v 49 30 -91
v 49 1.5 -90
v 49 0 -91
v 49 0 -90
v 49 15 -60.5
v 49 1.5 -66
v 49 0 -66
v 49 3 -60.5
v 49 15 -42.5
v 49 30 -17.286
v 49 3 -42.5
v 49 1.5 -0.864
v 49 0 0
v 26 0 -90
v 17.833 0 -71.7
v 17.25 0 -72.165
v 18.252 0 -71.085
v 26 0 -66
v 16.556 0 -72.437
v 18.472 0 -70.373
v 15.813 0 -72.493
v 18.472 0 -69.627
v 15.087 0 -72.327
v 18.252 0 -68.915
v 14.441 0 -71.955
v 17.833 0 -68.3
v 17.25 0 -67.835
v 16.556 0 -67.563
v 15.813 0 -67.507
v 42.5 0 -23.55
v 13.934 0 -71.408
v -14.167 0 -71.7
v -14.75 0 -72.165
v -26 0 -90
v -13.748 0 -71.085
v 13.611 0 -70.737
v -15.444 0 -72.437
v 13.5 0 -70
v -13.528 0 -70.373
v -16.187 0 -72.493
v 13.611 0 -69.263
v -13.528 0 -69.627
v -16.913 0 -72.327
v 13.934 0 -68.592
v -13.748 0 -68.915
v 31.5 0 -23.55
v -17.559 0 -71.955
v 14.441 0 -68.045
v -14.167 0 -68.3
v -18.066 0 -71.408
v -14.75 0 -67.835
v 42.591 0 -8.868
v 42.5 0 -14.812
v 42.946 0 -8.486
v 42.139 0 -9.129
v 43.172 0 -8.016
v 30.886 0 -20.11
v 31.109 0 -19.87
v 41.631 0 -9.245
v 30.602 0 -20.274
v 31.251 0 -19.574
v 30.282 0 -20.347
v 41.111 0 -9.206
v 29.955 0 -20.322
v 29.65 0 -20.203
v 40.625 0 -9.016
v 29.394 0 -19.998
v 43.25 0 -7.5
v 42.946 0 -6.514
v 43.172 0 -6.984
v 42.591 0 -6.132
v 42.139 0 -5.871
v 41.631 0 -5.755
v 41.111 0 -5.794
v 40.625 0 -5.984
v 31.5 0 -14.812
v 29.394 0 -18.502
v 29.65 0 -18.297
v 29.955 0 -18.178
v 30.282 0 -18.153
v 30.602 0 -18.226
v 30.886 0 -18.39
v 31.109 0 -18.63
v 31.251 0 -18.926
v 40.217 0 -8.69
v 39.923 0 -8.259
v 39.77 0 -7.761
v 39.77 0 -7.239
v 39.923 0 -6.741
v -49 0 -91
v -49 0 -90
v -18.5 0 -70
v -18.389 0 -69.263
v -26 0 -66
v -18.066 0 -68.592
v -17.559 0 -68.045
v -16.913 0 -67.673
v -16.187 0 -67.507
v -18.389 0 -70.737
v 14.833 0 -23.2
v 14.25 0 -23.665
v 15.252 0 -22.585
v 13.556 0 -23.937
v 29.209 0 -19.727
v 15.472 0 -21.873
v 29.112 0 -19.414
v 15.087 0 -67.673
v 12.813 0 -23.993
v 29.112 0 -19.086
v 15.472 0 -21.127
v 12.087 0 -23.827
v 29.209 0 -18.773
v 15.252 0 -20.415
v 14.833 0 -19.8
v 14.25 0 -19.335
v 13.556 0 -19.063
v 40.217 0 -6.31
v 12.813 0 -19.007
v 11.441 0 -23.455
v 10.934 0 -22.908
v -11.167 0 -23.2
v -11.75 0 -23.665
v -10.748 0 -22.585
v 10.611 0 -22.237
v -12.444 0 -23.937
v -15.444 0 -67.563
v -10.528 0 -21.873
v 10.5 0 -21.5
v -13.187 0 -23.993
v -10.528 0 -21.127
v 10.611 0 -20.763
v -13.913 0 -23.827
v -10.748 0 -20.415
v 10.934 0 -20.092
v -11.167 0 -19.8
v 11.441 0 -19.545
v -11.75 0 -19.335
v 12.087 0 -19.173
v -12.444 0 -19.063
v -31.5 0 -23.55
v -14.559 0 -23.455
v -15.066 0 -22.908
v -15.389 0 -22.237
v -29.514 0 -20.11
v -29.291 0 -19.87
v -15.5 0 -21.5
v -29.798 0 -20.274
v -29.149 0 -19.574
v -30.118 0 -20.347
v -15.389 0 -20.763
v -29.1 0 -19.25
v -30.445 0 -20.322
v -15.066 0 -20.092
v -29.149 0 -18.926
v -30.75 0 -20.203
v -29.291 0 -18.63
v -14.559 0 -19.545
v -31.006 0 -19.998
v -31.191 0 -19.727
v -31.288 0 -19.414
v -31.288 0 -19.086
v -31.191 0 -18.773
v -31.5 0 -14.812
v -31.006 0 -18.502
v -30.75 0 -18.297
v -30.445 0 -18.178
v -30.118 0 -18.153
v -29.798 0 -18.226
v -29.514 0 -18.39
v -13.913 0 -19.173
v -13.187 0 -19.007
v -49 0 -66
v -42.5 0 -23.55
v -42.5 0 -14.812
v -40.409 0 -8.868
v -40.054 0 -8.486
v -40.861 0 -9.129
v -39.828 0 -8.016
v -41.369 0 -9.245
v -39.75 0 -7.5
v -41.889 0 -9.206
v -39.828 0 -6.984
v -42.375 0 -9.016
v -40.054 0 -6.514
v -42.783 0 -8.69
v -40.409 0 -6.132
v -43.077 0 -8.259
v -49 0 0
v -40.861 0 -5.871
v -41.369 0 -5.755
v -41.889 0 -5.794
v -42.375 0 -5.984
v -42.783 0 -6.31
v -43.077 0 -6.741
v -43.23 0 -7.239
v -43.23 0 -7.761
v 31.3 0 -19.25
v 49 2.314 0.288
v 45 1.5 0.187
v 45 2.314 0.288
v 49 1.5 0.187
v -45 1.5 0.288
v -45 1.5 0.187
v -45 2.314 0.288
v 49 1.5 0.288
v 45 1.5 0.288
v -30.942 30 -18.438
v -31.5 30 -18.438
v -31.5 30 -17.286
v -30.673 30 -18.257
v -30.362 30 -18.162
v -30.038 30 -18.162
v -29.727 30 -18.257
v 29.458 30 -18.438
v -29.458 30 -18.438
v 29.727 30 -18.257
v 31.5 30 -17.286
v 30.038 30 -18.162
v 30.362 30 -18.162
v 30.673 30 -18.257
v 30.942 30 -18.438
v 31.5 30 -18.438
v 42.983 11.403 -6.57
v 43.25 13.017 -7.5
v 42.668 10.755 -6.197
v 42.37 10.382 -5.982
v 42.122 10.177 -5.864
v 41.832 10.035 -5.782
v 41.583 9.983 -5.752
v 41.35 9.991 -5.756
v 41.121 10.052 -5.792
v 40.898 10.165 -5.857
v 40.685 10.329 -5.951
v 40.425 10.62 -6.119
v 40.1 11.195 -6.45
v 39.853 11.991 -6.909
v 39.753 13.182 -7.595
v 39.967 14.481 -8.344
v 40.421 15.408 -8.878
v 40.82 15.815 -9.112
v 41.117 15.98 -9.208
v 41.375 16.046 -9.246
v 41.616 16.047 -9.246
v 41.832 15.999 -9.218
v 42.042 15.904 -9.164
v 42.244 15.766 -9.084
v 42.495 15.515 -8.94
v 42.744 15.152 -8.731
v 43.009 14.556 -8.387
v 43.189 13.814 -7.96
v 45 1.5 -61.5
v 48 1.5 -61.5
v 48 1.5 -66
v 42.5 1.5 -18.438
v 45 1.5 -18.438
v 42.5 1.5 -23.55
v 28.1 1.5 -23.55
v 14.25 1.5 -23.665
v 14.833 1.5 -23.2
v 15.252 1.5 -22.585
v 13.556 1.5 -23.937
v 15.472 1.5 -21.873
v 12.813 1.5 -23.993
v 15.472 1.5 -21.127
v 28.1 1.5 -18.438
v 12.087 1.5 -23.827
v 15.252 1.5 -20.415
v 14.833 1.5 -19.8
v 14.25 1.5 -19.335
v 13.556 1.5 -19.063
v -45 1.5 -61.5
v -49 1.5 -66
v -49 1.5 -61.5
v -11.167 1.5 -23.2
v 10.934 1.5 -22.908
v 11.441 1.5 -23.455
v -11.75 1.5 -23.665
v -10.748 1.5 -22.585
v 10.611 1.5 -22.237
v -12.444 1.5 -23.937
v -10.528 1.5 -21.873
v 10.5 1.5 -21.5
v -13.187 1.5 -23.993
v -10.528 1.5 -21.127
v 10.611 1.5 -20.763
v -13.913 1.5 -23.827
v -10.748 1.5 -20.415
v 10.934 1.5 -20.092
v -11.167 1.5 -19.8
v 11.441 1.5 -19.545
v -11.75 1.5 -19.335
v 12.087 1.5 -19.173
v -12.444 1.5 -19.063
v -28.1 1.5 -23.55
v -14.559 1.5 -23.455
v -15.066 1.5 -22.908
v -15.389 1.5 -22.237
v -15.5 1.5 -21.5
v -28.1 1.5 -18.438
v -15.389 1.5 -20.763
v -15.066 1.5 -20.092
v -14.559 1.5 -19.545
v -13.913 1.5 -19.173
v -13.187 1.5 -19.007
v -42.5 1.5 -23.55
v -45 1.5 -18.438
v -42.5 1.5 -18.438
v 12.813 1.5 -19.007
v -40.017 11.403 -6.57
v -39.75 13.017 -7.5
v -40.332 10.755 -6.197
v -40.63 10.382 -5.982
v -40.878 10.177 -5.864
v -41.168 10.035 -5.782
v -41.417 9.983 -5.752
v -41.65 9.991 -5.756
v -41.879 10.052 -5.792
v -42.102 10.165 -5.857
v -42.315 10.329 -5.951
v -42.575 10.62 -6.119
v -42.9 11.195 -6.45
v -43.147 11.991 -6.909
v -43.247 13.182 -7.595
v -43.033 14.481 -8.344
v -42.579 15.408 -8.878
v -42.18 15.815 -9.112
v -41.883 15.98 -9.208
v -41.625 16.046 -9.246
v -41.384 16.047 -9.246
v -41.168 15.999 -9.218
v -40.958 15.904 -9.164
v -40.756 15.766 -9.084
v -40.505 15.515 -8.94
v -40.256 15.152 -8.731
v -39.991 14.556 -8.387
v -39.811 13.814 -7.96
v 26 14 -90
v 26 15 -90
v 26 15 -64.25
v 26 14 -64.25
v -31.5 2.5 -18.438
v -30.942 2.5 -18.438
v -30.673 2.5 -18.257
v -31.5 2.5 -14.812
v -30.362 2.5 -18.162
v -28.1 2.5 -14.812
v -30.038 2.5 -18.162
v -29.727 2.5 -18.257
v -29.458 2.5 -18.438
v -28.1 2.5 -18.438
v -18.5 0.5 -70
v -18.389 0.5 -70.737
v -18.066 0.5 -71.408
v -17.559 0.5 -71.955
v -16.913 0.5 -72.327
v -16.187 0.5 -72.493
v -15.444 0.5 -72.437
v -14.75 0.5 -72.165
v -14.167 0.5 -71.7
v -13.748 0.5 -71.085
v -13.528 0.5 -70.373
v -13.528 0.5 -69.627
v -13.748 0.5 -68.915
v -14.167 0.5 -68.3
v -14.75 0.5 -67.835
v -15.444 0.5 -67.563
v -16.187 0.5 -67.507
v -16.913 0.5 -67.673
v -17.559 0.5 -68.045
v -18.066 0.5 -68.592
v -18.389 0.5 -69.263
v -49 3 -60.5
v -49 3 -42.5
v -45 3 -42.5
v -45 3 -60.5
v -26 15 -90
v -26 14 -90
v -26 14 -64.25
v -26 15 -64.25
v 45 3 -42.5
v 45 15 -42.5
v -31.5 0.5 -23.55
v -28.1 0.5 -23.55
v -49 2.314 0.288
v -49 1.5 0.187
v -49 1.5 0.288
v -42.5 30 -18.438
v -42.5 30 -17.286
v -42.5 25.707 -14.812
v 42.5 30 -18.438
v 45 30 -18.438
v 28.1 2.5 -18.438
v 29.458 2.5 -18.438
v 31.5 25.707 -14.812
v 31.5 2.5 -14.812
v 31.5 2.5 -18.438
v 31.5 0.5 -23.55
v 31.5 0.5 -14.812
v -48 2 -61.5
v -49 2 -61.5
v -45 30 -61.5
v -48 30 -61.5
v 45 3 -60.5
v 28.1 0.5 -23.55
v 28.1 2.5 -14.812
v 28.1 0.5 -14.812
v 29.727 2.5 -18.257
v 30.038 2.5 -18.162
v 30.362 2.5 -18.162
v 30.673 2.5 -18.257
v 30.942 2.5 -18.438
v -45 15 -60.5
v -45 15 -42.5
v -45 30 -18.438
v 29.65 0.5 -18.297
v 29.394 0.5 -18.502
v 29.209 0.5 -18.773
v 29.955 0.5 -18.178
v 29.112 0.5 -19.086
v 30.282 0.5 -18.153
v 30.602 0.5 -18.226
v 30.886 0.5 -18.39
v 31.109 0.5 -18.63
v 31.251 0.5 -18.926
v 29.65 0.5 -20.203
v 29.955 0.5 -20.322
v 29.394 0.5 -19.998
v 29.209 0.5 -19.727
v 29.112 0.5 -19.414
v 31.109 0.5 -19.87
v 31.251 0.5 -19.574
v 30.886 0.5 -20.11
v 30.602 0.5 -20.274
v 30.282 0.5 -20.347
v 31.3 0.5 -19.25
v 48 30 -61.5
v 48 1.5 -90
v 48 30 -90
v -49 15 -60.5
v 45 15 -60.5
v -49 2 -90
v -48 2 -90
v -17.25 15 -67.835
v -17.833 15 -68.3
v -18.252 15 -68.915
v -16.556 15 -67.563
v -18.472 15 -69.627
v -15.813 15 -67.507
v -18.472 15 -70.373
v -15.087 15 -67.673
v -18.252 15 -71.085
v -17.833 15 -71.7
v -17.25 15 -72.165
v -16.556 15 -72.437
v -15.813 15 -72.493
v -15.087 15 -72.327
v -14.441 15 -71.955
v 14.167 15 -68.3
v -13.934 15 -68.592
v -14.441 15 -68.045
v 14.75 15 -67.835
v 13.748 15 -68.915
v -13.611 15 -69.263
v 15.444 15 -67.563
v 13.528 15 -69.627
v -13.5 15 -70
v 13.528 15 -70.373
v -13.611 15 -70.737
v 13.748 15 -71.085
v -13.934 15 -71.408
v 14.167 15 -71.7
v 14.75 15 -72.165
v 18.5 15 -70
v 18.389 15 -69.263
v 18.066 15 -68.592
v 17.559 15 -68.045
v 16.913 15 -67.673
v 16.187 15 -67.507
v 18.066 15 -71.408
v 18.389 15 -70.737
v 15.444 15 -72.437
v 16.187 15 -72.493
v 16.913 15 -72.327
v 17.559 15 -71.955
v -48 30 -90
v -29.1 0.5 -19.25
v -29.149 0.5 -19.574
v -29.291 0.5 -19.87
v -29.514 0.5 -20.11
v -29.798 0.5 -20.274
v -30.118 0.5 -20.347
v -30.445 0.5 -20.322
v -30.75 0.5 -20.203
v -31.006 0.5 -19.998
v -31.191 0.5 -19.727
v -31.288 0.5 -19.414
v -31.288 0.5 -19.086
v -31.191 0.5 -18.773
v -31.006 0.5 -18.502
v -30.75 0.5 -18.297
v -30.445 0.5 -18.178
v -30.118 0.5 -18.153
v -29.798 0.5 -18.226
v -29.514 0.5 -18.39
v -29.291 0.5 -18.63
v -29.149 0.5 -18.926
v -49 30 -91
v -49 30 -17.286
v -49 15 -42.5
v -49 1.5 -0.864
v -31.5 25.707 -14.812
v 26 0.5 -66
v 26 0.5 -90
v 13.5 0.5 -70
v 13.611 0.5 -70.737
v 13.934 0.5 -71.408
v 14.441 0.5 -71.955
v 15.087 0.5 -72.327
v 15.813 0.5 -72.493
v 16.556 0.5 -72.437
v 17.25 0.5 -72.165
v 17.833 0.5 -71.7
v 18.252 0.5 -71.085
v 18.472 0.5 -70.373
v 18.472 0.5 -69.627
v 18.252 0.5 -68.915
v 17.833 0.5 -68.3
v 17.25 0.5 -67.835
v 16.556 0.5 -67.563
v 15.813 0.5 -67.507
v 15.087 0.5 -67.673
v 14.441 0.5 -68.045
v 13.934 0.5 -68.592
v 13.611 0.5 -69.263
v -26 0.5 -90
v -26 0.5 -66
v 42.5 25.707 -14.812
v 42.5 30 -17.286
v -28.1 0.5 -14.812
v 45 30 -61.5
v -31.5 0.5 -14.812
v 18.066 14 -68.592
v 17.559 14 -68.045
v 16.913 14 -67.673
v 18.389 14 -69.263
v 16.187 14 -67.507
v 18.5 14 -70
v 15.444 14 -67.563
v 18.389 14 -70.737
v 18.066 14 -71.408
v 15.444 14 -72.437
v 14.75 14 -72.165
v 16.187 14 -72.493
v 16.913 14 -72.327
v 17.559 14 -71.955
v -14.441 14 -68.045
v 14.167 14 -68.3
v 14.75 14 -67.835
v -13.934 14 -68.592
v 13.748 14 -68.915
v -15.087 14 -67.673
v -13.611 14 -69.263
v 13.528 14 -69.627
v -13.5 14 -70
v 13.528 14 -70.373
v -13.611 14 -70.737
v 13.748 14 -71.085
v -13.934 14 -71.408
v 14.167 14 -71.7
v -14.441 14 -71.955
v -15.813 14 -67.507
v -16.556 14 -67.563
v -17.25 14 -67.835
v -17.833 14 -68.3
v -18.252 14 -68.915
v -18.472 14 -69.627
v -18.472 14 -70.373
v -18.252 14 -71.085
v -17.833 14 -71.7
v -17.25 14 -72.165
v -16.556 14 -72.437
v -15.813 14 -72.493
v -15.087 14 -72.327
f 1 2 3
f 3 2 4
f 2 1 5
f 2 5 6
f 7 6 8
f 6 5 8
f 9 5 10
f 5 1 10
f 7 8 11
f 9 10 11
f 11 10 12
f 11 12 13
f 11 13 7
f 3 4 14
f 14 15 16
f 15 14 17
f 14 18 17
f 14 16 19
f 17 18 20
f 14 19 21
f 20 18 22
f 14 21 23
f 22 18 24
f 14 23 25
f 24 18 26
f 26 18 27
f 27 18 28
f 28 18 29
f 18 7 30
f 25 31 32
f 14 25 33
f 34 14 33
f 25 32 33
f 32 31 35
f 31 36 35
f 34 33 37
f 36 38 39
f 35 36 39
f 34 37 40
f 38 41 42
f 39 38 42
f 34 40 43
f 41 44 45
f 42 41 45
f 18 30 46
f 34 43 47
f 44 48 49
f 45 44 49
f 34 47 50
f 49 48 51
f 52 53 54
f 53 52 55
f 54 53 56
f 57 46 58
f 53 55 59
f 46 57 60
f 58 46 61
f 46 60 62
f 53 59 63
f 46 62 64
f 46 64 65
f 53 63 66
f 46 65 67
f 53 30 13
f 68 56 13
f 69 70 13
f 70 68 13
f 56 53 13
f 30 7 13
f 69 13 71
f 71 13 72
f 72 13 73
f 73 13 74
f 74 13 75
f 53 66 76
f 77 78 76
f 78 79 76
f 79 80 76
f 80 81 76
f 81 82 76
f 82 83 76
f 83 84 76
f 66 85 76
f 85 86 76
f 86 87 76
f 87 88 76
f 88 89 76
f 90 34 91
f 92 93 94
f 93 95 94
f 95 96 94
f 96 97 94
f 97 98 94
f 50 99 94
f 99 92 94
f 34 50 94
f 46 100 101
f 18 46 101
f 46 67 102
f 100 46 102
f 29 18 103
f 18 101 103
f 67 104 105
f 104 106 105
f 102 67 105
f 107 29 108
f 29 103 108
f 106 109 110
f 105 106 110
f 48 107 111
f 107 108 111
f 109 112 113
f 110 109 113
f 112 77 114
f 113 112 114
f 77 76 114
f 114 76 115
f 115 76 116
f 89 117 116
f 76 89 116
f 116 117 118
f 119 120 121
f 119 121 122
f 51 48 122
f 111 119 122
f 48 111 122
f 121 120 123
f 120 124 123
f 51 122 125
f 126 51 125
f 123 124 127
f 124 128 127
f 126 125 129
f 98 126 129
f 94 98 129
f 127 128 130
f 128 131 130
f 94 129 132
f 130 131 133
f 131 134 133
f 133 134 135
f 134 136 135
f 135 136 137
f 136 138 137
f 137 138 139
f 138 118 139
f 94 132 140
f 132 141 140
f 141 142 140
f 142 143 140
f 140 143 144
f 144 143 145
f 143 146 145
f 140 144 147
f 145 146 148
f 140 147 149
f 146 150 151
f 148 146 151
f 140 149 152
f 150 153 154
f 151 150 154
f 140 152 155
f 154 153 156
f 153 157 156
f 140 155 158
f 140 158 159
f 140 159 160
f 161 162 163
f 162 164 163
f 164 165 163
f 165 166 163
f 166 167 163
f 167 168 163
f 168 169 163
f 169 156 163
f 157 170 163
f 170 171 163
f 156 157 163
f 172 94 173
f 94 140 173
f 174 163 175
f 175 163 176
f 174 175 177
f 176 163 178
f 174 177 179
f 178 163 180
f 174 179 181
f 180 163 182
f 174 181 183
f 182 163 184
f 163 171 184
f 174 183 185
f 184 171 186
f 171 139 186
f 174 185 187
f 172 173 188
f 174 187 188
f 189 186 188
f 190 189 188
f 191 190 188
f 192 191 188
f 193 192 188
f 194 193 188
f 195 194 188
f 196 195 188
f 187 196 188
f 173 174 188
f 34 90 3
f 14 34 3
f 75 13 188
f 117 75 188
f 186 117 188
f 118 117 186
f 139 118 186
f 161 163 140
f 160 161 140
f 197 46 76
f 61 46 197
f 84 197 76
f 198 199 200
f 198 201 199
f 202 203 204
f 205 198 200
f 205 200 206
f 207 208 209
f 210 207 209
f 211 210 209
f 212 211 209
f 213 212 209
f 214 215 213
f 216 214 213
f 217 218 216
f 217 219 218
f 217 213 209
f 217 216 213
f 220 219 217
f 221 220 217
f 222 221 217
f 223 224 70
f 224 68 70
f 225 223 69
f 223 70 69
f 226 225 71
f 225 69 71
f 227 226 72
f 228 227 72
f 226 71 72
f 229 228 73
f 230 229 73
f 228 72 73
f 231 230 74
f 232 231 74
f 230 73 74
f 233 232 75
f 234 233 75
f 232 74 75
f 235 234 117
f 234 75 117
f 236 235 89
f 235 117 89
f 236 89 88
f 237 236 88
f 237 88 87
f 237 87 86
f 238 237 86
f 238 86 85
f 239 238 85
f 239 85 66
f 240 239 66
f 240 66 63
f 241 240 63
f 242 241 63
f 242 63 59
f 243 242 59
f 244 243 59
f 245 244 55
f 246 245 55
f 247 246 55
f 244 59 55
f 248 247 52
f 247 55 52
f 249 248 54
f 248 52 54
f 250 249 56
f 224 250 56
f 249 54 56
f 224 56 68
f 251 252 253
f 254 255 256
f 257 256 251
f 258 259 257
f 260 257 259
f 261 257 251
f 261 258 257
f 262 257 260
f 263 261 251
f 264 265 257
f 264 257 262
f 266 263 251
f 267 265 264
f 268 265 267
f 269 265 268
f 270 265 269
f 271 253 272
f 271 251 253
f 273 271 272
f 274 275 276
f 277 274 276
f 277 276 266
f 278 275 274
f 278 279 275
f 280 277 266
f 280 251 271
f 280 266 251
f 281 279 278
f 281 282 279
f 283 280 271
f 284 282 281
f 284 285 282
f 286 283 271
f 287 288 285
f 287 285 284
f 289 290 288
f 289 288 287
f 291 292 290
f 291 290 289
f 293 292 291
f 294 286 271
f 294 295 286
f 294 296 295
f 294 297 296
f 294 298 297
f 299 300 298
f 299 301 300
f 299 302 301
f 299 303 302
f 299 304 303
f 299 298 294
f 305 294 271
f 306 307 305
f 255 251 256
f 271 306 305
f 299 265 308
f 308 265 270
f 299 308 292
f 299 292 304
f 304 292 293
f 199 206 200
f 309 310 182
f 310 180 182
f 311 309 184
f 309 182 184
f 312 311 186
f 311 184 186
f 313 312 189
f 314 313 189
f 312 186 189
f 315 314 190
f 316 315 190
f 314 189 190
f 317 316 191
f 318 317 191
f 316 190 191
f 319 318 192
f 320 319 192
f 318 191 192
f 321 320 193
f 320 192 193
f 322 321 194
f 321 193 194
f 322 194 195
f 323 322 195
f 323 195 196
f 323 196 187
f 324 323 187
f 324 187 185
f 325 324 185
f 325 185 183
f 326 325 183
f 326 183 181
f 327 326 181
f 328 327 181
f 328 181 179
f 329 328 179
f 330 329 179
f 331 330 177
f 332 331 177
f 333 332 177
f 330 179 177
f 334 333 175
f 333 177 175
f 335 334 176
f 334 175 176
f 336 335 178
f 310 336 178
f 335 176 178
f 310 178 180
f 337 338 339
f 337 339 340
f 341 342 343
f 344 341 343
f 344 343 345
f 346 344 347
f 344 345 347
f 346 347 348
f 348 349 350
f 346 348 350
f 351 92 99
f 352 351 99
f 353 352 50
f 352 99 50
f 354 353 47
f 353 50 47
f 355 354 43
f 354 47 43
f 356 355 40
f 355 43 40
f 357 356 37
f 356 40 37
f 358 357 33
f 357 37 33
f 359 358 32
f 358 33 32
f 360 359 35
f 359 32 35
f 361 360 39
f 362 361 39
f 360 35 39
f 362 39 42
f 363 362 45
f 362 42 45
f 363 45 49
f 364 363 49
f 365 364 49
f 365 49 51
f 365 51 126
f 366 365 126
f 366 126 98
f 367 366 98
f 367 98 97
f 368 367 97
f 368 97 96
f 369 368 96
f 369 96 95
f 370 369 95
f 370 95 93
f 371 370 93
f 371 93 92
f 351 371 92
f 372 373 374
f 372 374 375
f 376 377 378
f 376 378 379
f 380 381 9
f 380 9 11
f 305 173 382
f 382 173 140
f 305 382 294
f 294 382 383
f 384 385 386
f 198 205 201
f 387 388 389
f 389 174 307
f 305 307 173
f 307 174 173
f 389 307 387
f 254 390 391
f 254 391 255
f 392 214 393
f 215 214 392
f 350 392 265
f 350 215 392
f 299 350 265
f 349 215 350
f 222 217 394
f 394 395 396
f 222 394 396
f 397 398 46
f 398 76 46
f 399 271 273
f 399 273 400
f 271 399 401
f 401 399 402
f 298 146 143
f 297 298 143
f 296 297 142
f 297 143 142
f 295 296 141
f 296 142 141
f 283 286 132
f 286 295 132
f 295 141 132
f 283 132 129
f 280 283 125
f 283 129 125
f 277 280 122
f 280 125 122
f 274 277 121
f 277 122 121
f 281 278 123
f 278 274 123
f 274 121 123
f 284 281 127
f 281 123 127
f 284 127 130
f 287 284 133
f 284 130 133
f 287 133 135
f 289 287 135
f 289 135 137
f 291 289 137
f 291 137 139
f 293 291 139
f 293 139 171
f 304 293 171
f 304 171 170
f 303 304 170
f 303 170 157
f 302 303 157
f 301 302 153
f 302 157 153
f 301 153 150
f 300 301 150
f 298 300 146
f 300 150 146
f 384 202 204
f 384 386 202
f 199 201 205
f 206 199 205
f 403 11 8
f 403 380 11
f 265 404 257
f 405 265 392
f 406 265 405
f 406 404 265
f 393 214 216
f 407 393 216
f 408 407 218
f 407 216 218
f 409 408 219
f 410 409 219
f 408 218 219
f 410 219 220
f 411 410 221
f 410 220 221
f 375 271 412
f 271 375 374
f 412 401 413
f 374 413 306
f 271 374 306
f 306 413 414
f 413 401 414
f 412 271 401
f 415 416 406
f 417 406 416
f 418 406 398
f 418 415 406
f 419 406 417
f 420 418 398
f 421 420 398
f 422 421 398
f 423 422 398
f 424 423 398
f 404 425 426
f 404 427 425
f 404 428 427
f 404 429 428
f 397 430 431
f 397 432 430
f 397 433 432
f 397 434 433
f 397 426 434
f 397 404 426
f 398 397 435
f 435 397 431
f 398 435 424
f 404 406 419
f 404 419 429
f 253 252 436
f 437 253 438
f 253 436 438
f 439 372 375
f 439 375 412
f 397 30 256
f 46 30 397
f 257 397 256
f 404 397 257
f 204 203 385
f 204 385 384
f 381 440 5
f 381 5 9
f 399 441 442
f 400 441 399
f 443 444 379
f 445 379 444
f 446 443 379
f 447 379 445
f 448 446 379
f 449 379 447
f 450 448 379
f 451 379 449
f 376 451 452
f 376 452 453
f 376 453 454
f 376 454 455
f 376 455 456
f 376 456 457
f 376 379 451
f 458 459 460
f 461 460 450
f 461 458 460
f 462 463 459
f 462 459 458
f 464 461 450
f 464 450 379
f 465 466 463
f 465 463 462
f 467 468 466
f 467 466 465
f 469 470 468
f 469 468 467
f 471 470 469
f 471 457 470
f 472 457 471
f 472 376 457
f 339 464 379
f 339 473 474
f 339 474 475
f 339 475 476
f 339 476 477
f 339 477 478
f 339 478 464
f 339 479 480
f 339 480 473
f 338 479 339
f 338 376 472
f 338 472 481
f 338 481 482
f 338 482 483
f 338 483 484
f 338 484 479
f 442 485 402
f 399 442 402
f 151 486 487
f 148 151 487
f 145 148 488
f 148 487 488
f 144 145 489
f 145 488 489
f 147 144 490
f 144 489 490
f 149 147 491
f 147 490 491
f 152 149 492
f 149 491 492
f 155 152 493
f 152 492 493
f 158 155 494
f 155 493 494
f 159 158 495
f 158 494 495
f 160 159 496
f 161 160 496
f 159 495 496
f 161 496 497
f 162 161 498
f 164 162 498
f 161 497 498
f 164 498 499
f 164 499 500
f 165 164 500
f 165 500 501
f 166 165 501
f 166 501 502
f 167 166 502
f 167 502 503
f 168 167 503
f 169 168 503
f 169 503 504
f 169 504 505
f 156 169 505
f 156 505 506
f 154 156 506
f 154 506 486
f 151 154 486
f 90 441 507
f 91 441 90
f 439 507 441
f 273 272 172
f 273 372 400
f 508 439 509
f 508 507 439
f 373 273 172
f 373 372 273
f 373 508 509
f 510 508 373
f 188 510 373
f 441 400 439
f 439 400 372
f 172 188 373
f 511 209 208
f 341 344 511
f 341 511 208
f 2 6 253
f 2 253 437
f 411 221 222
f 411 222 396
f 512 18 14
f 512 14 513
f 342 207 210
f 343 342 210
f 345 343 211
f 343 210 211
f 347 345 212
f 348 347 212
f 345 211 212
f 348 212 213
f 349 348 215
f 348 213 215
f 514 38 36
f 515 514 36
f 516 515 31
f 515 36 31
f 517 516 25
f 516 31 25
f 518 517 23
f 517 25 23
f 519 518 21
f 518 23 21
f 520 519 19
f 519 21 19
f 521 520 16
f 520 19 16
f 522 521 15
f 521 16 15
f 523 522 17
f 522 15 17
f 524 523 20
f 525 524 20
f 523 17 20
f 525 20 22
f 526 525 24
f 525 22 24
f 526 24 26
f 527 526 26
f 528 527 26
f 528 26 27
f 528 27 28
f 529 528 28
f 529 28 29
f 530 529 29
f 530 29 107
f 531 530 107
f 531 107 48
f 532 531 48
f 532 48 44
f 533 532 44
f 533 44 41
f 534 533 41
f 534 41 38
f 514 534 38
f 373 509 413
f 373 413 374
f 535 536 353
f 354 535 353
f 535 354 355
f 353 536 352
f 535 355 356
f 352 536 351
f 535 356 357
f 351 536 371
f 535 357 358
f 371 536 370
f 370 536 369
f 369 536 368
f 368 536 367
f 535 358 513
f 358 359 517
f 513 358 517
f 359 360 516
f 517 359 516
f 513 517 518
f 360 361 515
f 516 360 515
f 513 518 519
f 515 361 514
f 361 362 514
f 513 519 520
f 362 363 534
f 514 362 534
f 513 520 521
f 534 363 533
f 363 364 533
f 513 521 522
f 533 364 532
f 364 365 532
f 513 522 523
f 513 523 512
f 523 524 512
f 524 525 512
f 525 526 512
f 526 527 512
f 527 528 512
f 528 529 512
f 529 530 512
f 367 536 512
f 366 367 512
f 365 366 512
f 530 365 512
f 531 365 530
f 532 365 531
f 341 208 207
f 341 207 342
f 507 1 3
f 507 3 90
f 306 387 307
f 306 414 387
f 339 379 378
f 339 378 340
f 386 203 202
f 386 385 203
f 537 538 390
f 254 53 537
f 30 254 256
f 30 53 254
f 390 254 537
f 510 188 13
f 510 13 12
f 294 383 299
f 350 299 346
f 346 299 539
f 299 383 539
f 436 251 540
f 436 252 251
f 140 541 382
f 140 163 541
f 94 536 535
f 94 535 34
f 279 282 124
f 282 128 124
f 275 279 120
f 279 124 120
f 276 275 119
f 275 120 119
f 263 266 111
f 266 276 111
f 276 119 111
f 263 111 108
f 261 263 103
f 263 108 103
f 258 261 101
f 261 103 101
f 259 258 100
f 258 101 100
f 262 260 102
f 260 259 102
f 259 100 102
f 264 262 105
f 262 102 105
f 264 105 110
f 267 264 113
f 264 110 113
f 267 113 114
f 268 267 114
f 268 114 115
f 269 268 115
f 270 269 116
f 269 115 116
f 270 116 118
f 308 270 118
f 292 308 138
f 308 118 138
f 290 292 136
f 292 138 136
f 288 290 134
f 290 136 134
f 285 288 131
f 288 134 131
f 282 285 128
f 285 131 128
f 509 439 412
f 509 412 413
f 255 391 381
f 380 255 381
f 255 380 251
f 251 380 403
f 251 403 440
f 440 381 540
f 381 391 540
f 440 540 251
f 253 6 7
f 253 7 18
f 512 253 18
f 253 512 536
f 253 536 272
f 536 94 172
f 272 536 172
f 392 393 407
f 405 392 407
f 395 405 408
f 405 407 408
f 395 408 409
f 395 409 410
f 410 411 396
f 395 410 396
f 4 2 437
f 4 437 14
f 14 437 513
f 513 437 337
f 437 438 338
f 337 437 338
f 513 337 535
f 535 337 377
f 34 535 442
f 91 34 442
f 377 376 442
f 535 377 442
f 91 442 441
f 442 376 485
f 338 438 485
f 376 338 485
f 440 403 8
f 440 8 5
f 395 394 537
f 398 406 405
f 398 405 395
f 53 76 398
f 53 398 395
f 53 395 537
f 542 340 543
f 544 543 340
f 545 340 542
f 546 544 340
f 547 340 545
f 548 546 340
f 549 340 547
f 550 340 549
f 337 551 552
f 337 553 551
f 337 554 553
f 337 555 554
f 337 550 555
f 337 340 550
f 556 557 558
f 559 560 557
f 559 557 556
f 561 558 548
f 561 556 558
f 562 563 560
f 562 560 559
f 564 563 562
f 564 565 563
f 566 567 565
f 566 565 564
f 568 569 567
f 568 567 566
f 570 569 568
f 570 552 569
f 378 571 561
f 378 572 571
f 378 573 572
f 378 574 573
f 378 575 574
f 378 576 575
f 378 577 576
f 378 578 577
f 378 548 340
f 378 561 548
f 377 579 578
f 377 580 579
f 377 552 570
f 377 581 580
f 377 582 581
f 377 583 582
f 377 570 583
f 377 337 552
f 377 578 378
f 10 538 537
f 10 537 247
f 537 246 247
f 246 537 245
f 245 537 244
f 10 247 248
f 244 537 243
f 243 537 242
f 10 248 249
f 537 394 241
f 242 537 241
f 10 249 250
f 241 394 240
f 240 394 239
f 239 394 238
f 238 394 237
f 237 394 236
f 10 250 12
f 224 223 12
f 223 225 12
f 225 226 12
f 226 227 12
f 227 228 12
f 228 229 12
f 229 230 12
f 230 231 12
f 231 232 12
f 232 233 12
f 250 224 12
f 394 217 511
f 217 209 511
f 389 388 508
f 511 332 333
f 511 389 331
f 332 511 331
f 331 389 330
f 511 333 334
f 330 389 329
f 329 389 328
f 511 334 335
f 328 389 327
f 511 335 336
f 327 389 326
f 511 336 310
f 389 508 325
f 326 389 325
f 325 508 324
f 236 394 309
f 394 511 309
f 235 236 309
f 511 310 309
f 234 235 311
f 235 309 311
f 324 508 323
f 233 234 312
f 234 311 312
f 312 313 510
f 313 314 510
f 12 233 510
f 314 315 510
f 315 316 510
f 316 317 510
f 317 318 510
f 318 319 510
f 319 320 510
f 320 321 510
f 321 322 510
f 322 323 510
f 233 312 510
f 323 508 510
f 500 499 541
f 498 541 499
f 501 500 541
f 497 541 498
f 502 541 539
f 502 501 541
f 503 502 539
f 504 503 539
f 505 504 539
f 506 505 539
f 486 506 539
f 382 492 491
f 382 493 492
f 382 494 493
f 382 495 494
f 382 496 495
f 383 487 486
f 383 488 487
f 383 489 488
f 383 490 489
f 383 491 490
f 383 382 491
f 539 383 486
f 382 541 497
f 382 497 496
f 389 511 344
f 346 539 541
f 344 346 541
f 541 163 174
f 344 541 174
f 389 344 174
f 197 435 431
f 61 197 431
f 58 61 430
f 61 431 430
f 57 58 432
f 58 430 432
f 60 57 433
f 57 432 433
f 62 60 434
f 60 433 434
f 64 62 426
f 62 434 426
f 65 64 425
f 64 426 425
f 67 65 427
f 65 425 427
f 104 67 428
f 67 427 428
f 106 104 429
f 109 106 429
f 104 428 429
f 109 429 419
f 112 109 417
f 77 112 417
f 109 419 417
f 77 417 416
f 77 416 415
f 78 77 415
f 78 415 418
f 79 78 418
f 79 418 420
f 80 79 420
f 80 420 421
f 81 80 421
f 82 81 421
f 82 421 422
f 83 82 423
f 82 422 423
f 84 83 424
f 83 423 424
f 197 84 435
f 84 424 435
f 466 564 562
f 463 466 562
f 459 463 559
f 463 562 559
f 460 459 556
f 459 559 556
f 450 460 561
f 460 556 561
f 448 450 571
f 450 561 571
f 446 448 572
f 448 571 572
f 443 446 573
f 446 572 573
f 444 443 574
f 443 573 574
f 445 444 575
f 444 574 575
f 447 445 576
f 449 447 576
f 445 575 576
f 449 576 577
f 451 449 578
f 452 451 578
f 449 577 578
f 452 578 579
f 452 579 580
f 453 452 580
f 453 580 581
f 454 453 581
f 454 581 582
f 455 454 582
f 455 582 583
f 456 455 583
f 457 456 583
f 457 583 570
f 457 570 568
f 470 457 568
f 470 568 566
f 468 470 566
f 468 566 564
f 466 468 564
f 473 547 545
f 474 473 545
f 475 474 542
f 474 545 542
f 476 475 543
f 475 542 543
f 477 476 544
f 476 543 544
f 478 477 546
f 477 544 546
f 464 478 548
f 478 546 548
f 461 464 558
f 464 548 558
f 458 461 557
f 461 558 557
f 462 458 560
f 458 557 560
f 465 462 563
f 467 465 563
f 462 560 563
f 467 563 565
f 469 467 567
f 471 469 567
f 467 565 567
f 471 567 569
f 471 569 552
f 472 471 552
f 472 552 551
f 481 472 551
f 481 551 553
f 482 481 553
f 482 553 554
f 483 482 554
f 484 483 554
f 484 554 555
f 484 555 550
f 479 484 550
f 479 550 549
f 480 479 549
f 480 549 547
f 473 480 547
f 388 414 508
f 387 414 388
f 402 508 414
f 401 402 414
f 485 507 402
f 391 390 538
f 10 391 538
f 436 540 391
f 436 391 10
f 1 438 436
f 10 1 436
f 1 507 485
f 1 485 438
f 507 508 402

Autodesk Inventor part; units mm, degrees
ref_plane "YZ Plane" through (0, 0, 0) normal (1, 0, 0) x (0, 1, 0)
ref_plane "XZ Plane" through (0, 0, 0) normal (0, 1, 0) x (-1, 0, 0)
ref_plane "XY Plane" through (0, 0, 0) normal (0, 0, 1) x (1, 0, 0)
sketch "Boceto2" plane through (0, 0, 0) normal (0, 1, 0) x (-1, 0, 0)
  line L0 (-49, 0) -> (49, 0)
  line L1 (49, 0) -> (49, -87)
  line L2 (49, -87) -> (-49, -87)
  line L3 (-49, -87) -> (-49, 0)
  line L4 (0, -87) -> (0, 0) construction
  circle A0 centre (-41.5, -7.5) radius 1.75
  circle A1 centre (41.5, -7.5) radius 1.75
  line L5 (-26, -87) -> (-26, -66)
  line L6 (-26, -66) -> (-49, -66)
  line L7 (26, -87) -> (26, -66)
  line L8 (26, -66) -> (49, -66)
  line L9 (49, -12) -> (-49, -12) construction
  line L10 (44.5, -24.05) -> (28.5, -24.05)
  line L11 (28.5, -24.05) -> (28.5, -13.05)
  line L12 (28.5, -13.05) -> (44.5, -13.05)
  line L13 (44.5, -13.05) -> (44.5, -24.05)
  line L14 (42.5, -23.55) -> (31.5, -23.55)
  line L15 (31.5, -14.85) -> (42.5, -14.85)
  line L16 (42.5, -14.85) -> (42.5, -23.55)
  circle A2 centre (30.2, -19.25) radius 1.05
  line L17 (31.5, -14.85) -> (31.5, -23.55)
  line L18 (-42.5, -23.55) -> (-31.5, -23.55)
  line L19 (-31.5, -14.85) -> (-42.5, -14.85)
  line L20 (-42.5, -14.85) -> (-42.5, -23.55)
  circle A3 centre (-30.2, -19.25) radius 1.05
  line L21 (-31.5, -14.85) -> (-31.5, -23.55)
  circle A4 centre (13, -21.5) radius 2.5
  circle A5 centre (-13, -21.5) radius 2.5
  circle A6 centre (16, -70) radius 2.5
  circle A7 centre (-16, -70) radius 2.5
  point P0 (26, -87)
  dimension "d6" = 3.5
  dimension "d210" = 0
  dimension "d219" = 87
  dimension "d220" = 21
  dimension "d221" = 12
  dimension "d222" = 23
  dimension "d223" = 98
  dimension "d224" = 7.5
  dimension "d225" = 7.5
  dimension "d226" = 79.5
  dimension "d229" = 2.1
  dimension "d230" = 9
  dimension "d231" = 11
  dimension "d232" = 16
  dimension "d235" = 1
  dimension "d236" = 3.6
  dimension "d239" = 2.1
  dimension "d241" = 1.3
  dimension "d242" = 5
  dimension "d243" = 36
  dimension "d244" = 9.5
  dimension "d245" = 5
  dimension "d246" = 17
  dimension "d247" = 10
  dimension "d252" = 8.7
  dimension "d254" = 4.3
  dimension "d255" = 4
  dimension "d256" = 11
  dimension "d257" = 54
  dimension "d258" = 2.85
extrude "Extrusion Base" add sketch "Boceto2" along normal blind 1.5 contours L0 L1 L8 L7 L2 L5 L6 L3 | L10 L11 L12 L13
sketch "Boceto4" plane through (-49, 0, -66) normal (-1, 0, 0) x (0, 0, 1)
  line L0 (66, 0) -> (0, 0) projected
  line L1 (66, 0) -> (65.1357, 1.5)
  line L2 (66, 0) -> (67.7312, 0) construction
  line L3 (65.1357, 1.5) -> (66, 1.5)
  line L4 (66, 0) -> (66, 1.5) projected
  line L5 (66, 1.5) -> (66, 0)
  dimension "d24" = 119.95
extrude "Extrusión Angulo parte de adelante" cut sketch "Boceto4" against normal blind 100
sketch "Boceto10" plane through (49, 0, 0) normal (1, 0, 0) x (0, 0, -1)
  line L0 (0, 0) -> (0.8643, 1.5) projected
  line L1 (0.8643, 1.5) -> (-0.2881, 1.5)
  line L2 (-0.2881, 1.5) -> (61.5, 1.5)
  line L3 (61.5, 1.5) -> (61.5, 32)
  line L4 (61.5, 32) -> (-0.2881, 32)
  line L5 (-0.2881, 32) -> (-0.2881, 1.5)
extrude "Grado de inclinacion de 60.5 de parte delantera" add sketch "Boceto10" against normal blind 4
sketch "Boceto11" plane through (-49, 0, -66) normal (-1, 0, 0) x (0, 0, 1)
  line L0 (65.1357, 1.5) -> (4.5, 1.5) projected
  line L1 (65.1357, 1.5) -> (66.2881, 1.5) projected
  line L2 (66.2881, 1.5) -> (66.2881, 32) projected
  line L3 (66.2881, 32) -> (4.5, 32) projected
  line L4 (4.5, 2) -> (4.5, 32) projected
  line L5 (66.2881, 1.5) -> (4.5, 1.5)
  line L6 (4.5, 1.5) -> (4.5, 32)
  line L7 (4.5, 32) -> (66.2881, 32)
  line L8 (66.2881, 32) -> (66.2881, 1.5)
  line L9 (4.5, 32) -> (4.5, 1.5) projected
  point P0 (66, 0)
  point P1 (4.5, 1.5)
extrude "Lateral derecha de diseño" add sketch "Boceto11" against normal blind 4
sketch "Boceto13" plane through (49, 0, 0) normal (1, 0, 0) x (0, 0, -1)
  line L0 (0.8643, 1.5) -> (0, 0) projected
  line L1 (0, 0) -> (18.438, 32)
  line L2 (0, 0) -> (36.9318, 0) construction
  line L3 (66, 0) -> (0, 0) projected
  line L4 (61.5, 32) -> (-0.2881, 32) projected
  line L5 (0, 0) -> (-3.9848, 32)
  line L6 (-3.9848, 32) -> (18.438, 32)
  line L7 (-0.2881, 32) -> (61.5, 32) projected
  point P0 (4, 32)
  point P1 (-0.2881, 32)
  dimension "d59" = 60.05
extrude "Lateral izquierda diseño" cut sketch "Boceto13" against normal blind 103.25
sketch "Boceto15" plane through (-45, 0, -66) normal (1, 0, 0) x (0, 0, -1)
  line L0 (-47.562, 32) -> (-66, 0) projected
  line L1 (-66, 0) -> (0, 0) projected
  line L2 (-4.5, 32) -> (-66.2881, 32) projected
  line L3 (-47.562, 32) -> (-47.562, 0)
  line L4 (0, 0) -> (-66, 0) projected
  line L5 (-66, 0) -> (-65.1357, 1.5) projected
  line L6 (-66, 0) -> (-47.562, 0)
  line L7 (-66, 0) -> (-47.562, 32)
  line L8 (0, 0) -> (0, 1.5) projected
  line L9 (-4.5, 1.5) -> (0, 1.5) projected
  line L10 (-4.5, 1.5) -> (-4.5, 32) projected
  line L11 (-4.5, 32) -> (-47.562, 32) projected
  line L12 (-66.2881, 2.3136) -> (-66.2881, 1.5) projected
  line L13 (-66.2881, 1.5) -> (-66.1868, 1.5) projected
  line L14 (-66.1868, 1.5) -> (-66.2881, 2.3136) projected
extrude "Extrusion capa parte delantera" add sketch "Boceto15" along normal blind 93 contours L3 L1 L0
sketch "Boceto17" plane through (0, 0, 0) normal (0, -1, 0) x (1, 0, 0)
  line L0 (-49, 0) -> (49, 0) projected
  line L1 (49, 0) -> (41.5, 0)
  line L2 (41.5, 0) -> (41.5, -7.5)
  line L3 (41.5, -7.5) -> (49, -7.5)
  line L4 (49, -7.5) -> (49, 0)
  circle A0 centre (41.5, -7.5) radius 1.75
  line L5 (0, 0) -> (0, -85.5)
  line L6 (-26, -85.5) -> (26, -85.5) projected
  circle A1 centre (-41.5, -7.5) radius 1.75
  dimension "d67" = 7.5
  dimension "d68" = 7.5
  dimension "d69" = 3.5
extrude "Extrusión huecos tornillos parte delantera" cut sketch "Boceto17" against normal blind 90.25 contours A0 L3 L2 | L2 L3 A0 | A1
sketch "Boceto25" plane through (-49, 0, -66) normal (-1, 0, 0) x (0, 0, 1)
  line L0 (5.5, 15) -> (23.5, 15)
  line L1 (23.5, 15) -> (23.5, 3)
  line L2 (23.5, 3) -> (5.5, 3)
  line L3 (5.5, 3) -> (5.5, 15)
  line L4 (0, 0) -> (66, 0) projected
  dimension "d131" = 3
  dimension "d132" = 18
  dimension "d133" = 12
extrude "Extrusión sensores laterales" cut sketch "Boceto25" against normal blind 98.25
sketch "Boceto39" plane through (0, 1.5, 0) normal (0, 1, 0) x (1, 0, 0)
  line L0 (-42.5, 23.55) -> (-31.5, 23.55)
  line L1 (-31.5, 23.55) -> (-31.5, 14.8119)
  line L2 (-31.5, 14.8119) -> (-42.5, 14.8119)
  line L3 (-42.5, 14.8119) -> (-42.5, 23.55)
  circle A0 centre (-30.2, 19.25) radius 1.1
  line L4 (0, 64) -> (0, 18.438)
  line L5 (-29.5343, 18.438) -> (29.5343, 18.438) projected
  line L6 (42.5, 23.55) -> (31.5, 23.55)
  line L7 (31.5, 23.55) -> (31.5, 14.8119)
  line L8 (31.5, 14.8119) -> (42.5, 14.8119)
  line L9 (42.5, 14.8119) -> (42.5, 23.55)
  circle A1 centre (30.2, 19.25) radius 1.1
  arc A2 (-29.5343, 18.438) -> (-30.8657, 18.438) centre (-30.2, 19.25) ccw projected
  point P0 (0, 0)
  dimension "d259" = 11
  dimension "d262" = 2.2
  dimension "d263" = 1.3
  dimension "d264" = 4.3
  dimension "d270" = 2.15
extrude "Extrusión arreglo sensores" cut sketch "Boceto39" along normal mid plane 85.25
sketch "Boceto40" plane through (0, 1.5, 0) normal (0, 1, 0) x (1, 0, 0)
  line L0 (-30.65, 14.8119) -> (-31.5, 14.8119)
  line L1 (0, 64) -> (0, 18.438)
  line L2 (-29.5343, 18.438) -> (29.5343, 18.438) projected
  line L3 (31.5, 23.55) -> (31.5, 14.8119)
  line L4 (31.5, 23.55) -> (30.65, 23.55)
  line L5 (30.65, 23.55) -> (30.65, 14.8119)
  line L6 (30.65, 14.8119) -> (31.5, 14.8119)
  line L7 (-31.5, 23.55) -> (-28.1, 23.55)
  line L8 (-28.1, 23.55) -> (-28.1, 14.8119)
  line L9 (-28.1, 14.8119) -> (-31.5, 14.8119)
  line L10 (-31.5, 14.8119) -> (-31.5, 23.55)
  arc A0 (-29.4579, 18.438) -> (-30.9421, 18.438) centre (-30.2, 19.25) ccw projected
  line L11 (31.5, 23.55) -> (28.1, 23.55)
  line L12 (28.1, 23.55) -> (28.1, 14.8119)
  line L13 (28.1, 14.8119) -> (31.5, 14.8119)
  line L14 (31.5, 14.8119) -> (31.5, 23.55)
  point P0 (0, 0)
  point P1 (-31.5, 14.8119)
  point P2 (31.5, 14.8119)
  dimension "d271" = 1
extrude "Extrusión desnivel sensores" cut sketch "Boceto40" along normal mid plane 2
sketch "Boceto placa" plane through (0, 1.5, 0) normal (0, 1, 0) x (1, 0, 0)
  circle A0 centre (-32, 31.5) radius 1.75 projected
  circle A1 centre (31.5, 58) radius 1.75 projected
  line L0 (-32, 31.5) -> (31.5, 31.5)
  line L1 (31.5, 31.5) -> (31.5, 58)
  line L2 (31.5, 58) -> (-32, 58)
  line L3 (-32, 58) -> (-32, 31.5)
  line L4 (-42, 27.507) -> (42, 27.507)
  line L5 (42, 27.507) -> (42, 63.007)
  line L6 (42, 63.007) -> (-42, 63.007)
  line L7 (-42, 63.007) -> (-42, 27.507)
  line L8 (-45, 61.5) -> (-45, 18.438) projected
  line L9 (45, 18.438) -> (45, 61.5) projected
  line L10 (-22.385, 61.5) -> (-45, 61.5) projected
  line L11 (-45, 18.438) -> (45, 18.438) projected
  point P0 (0, 0)
  point P1 (-45, -0.2881)
  dimension "d167" = 63.5
  dimension "d168" = 26.5
  dimension "d172" = 84
  dimension "d176" = 10
  dimension "d177" = 3.993
  dimension "d178" = 3.5
  dimension "d179" = 35.5
  dimension "d180" = 9.069
sketch "Boceto48" plane through (0, 1.5, 0) normal (0, 1, 0) x (1, 0, 0)
  line L0 (26, 87) -> (-26, 87) projected
  line L1 (-26, 66) -> (26, 66)
  line L2 (26, 66) -> (26, 87)
  line L3 (26, 87) -> (-26, 87)
  line L4 (-26, 87) -> (-26, 66)
  point P0 (0, 0)
  point P1 (-26, 87)
extrude "Extrusión35" cut sketch "Boceto48" against normal blind 1
sketch "Boceto49" plane through (49, 0, -66) normal (1, 0, 0) x (0, 0, -1)
  line L0 (-4.5, 1.5) -> (-4.5, 32) projected
  line L1 (-4.5, 1.5) -> (24, 1.5)
  line L2 (24, 1.5) -> (24, 32)
  line L3 (24, 32) -> (-4.5, 32)
  line L4 (-4.5, 32) -> (-4.5, 1.5)
  point P0 (-66, 0)
  dimension "d281" = 28.5
extrude "Extrusión36" add sketch "Boceto49" against normal blind 1
sketch "Boceto50" plane through (-49, 0, -66) normal (-1, 0, 0) x (0, 0, 1)
  line L0 (4.5, 32) -> (4.5, 1.5) projected
  line L1 (4.5, 32) -> (-24, 32)
  line L2 (-24, 32) -> (-24, 2)
  line L3 (-24, 2) -> (4.5, 2)
  line L4 (4.5, 2) -> (4.5, 32)
  point P0 (66, 0)
  dimension "d284" = 28.5
extrude "Extrusión37" add sketch "Boceto50" against normal blind 1
sketch "Boceto52" plane through (26, 0, -87) normal (0, 0, -1) x (-1, 0, 0)
  line L0 (0, 0.5) -> (52, 0.5) projected
  line L1 (0, -0.5) -> (52, -0.5)
  line L2 (52, -0.5) -> (52, 0.5)
  line L3 (52, 0.5) -> (0, 0.5)
  line L4 (0, 0.5) -> (0, -0.5)
  point P0 (26, 0)
sketch "Boceto53" plane through (26, 0, -87) normal (0, 0, -1) x (-1, 0, 0)
  line L0 (52, 0.5) -> (0, 0.5) projected
  line L1 (52, 0) -> (75, 0) projected
  line L2 (0, 0.5) -> (52, 0.5)
  line L3 (52, 0.5) -> (52, 0)
  line L4 (52, 0) -> (0, 0)
  line L5 (0, 0) -> (0, 0.5)
  point P0 (26, 0)
extrude "Extrusión39" add sketch "Boceto53" along normal blind 3
sketch "Boceto54" plane through (26, 0, -90) normal (0, 0, -1) x (-1, 0, 0)
  point P0 (26, 0)
sketch "Boceto55" plane through (26, 0, -90) normal (0, 0, -1) x (-1, 0, 0)
  line L0 (-23, 0) -> (0, 0) projected
  line L1 (75, 32) -> (75, 2) projected
  line L2 (-23, 0) -> (75, 0)
  line L3 (75, 0) -> (75, 32)
  line L4 (75, 32) -> (-23, 32)
  line L5 (-23, 32) -> (-23, 0)
  point P0 (26, 0)
extrude "Extrusión40" add sketch "Boceto55" along normal blind 1
sketch "Boceto56" plane through (26, 0, -90) normal (0, 0, 1) x (1, 0, 0)
  line L0 (-52, 15) -> (0, 15)
  line L1 (0, 15) -> (0, 14)
  line L2 (0, 14) -> (-52, 14)
  line L3 (-52, 14) -> (-52, 15)
  line L4 (-52, 0.5) -> (0, 0.5) projected
  point P0 (-26, 0)
  dimension "d293" = 13.5
  dimension "d294" = 1
  dimension "d295" = 0
  dimension "d296" = 0
extrude "Extrusión41" add sketch "Boceto56" along normal blind 25.75
sketch "Boceto57" plane through (-26, 14, -90) normal (0, -1, 0) x (1, 0, 0)
  circle A0 centre (10, 20) radius 2.5 projected
  circle A1 centre (10, 20) radius 2.5
  circle A2 centre (42, 20) radius 2.5 projected
  circle A3 centre (42, 20) radius 2.5
  point P0 (26, 90)
extrude "Extrusión42" cut sketch "Boceto57" against normal blind 25.75
sketch "Boceto58" plane through (-26, 15, -90) normal (0, 1, 0) x (1, 0, 0)
  point P0 (26, -90)
sketch "Boceto59" plane through (-49, 0, -66) normal (-1, 0, 0) x (0, 0, 1)
  point P0 (66, 0)
sketch "Boceto60" plane through (-45, 32, -18.438) normal (0, 1, 0) x (1, 0, 0)
  line L0 (-4, -18.6248) -> (0, -18.6248) projected
  line L1 (94, 71.562) -> (94, 72.562) projected
  line L2 (-4, -18.6248) -> (94, -18.6248)
  line L3 (94, -18.6248) -> (94, 72.562)
  line L4 (94, 72.562) -> (-4, 72.562)
  line L5 (-4, 72.562) -> (-4, -18.6248)
  point P0 (45, -18.438)
extrude "Extrusión43" cut sketch "Boceto60" against normal blind 2
equation "\"Radio_pliegue\" = Grosor"
equation "\"Anchura_desahogo_plegado\" = Grosor"
equation "\"Profundidad_desahogo_plegado\" = 0.5 * Grosor"
equation "\"Tamaño_destalonado\" = 4 * Grosor"
equation "\"Remanente_mínimo\" = 2 * Grosor"
equation "\"Radiodetransición\" = Radio_pliegue"
equation "\"Tamaño_de_radio_de_Jacobi\" = Radio_pliegue"
equation "\"TamañoSeparación\" = Grosor"
equation "\"Grosor\" = 0.5"
properties part number "Base Onixium2"
